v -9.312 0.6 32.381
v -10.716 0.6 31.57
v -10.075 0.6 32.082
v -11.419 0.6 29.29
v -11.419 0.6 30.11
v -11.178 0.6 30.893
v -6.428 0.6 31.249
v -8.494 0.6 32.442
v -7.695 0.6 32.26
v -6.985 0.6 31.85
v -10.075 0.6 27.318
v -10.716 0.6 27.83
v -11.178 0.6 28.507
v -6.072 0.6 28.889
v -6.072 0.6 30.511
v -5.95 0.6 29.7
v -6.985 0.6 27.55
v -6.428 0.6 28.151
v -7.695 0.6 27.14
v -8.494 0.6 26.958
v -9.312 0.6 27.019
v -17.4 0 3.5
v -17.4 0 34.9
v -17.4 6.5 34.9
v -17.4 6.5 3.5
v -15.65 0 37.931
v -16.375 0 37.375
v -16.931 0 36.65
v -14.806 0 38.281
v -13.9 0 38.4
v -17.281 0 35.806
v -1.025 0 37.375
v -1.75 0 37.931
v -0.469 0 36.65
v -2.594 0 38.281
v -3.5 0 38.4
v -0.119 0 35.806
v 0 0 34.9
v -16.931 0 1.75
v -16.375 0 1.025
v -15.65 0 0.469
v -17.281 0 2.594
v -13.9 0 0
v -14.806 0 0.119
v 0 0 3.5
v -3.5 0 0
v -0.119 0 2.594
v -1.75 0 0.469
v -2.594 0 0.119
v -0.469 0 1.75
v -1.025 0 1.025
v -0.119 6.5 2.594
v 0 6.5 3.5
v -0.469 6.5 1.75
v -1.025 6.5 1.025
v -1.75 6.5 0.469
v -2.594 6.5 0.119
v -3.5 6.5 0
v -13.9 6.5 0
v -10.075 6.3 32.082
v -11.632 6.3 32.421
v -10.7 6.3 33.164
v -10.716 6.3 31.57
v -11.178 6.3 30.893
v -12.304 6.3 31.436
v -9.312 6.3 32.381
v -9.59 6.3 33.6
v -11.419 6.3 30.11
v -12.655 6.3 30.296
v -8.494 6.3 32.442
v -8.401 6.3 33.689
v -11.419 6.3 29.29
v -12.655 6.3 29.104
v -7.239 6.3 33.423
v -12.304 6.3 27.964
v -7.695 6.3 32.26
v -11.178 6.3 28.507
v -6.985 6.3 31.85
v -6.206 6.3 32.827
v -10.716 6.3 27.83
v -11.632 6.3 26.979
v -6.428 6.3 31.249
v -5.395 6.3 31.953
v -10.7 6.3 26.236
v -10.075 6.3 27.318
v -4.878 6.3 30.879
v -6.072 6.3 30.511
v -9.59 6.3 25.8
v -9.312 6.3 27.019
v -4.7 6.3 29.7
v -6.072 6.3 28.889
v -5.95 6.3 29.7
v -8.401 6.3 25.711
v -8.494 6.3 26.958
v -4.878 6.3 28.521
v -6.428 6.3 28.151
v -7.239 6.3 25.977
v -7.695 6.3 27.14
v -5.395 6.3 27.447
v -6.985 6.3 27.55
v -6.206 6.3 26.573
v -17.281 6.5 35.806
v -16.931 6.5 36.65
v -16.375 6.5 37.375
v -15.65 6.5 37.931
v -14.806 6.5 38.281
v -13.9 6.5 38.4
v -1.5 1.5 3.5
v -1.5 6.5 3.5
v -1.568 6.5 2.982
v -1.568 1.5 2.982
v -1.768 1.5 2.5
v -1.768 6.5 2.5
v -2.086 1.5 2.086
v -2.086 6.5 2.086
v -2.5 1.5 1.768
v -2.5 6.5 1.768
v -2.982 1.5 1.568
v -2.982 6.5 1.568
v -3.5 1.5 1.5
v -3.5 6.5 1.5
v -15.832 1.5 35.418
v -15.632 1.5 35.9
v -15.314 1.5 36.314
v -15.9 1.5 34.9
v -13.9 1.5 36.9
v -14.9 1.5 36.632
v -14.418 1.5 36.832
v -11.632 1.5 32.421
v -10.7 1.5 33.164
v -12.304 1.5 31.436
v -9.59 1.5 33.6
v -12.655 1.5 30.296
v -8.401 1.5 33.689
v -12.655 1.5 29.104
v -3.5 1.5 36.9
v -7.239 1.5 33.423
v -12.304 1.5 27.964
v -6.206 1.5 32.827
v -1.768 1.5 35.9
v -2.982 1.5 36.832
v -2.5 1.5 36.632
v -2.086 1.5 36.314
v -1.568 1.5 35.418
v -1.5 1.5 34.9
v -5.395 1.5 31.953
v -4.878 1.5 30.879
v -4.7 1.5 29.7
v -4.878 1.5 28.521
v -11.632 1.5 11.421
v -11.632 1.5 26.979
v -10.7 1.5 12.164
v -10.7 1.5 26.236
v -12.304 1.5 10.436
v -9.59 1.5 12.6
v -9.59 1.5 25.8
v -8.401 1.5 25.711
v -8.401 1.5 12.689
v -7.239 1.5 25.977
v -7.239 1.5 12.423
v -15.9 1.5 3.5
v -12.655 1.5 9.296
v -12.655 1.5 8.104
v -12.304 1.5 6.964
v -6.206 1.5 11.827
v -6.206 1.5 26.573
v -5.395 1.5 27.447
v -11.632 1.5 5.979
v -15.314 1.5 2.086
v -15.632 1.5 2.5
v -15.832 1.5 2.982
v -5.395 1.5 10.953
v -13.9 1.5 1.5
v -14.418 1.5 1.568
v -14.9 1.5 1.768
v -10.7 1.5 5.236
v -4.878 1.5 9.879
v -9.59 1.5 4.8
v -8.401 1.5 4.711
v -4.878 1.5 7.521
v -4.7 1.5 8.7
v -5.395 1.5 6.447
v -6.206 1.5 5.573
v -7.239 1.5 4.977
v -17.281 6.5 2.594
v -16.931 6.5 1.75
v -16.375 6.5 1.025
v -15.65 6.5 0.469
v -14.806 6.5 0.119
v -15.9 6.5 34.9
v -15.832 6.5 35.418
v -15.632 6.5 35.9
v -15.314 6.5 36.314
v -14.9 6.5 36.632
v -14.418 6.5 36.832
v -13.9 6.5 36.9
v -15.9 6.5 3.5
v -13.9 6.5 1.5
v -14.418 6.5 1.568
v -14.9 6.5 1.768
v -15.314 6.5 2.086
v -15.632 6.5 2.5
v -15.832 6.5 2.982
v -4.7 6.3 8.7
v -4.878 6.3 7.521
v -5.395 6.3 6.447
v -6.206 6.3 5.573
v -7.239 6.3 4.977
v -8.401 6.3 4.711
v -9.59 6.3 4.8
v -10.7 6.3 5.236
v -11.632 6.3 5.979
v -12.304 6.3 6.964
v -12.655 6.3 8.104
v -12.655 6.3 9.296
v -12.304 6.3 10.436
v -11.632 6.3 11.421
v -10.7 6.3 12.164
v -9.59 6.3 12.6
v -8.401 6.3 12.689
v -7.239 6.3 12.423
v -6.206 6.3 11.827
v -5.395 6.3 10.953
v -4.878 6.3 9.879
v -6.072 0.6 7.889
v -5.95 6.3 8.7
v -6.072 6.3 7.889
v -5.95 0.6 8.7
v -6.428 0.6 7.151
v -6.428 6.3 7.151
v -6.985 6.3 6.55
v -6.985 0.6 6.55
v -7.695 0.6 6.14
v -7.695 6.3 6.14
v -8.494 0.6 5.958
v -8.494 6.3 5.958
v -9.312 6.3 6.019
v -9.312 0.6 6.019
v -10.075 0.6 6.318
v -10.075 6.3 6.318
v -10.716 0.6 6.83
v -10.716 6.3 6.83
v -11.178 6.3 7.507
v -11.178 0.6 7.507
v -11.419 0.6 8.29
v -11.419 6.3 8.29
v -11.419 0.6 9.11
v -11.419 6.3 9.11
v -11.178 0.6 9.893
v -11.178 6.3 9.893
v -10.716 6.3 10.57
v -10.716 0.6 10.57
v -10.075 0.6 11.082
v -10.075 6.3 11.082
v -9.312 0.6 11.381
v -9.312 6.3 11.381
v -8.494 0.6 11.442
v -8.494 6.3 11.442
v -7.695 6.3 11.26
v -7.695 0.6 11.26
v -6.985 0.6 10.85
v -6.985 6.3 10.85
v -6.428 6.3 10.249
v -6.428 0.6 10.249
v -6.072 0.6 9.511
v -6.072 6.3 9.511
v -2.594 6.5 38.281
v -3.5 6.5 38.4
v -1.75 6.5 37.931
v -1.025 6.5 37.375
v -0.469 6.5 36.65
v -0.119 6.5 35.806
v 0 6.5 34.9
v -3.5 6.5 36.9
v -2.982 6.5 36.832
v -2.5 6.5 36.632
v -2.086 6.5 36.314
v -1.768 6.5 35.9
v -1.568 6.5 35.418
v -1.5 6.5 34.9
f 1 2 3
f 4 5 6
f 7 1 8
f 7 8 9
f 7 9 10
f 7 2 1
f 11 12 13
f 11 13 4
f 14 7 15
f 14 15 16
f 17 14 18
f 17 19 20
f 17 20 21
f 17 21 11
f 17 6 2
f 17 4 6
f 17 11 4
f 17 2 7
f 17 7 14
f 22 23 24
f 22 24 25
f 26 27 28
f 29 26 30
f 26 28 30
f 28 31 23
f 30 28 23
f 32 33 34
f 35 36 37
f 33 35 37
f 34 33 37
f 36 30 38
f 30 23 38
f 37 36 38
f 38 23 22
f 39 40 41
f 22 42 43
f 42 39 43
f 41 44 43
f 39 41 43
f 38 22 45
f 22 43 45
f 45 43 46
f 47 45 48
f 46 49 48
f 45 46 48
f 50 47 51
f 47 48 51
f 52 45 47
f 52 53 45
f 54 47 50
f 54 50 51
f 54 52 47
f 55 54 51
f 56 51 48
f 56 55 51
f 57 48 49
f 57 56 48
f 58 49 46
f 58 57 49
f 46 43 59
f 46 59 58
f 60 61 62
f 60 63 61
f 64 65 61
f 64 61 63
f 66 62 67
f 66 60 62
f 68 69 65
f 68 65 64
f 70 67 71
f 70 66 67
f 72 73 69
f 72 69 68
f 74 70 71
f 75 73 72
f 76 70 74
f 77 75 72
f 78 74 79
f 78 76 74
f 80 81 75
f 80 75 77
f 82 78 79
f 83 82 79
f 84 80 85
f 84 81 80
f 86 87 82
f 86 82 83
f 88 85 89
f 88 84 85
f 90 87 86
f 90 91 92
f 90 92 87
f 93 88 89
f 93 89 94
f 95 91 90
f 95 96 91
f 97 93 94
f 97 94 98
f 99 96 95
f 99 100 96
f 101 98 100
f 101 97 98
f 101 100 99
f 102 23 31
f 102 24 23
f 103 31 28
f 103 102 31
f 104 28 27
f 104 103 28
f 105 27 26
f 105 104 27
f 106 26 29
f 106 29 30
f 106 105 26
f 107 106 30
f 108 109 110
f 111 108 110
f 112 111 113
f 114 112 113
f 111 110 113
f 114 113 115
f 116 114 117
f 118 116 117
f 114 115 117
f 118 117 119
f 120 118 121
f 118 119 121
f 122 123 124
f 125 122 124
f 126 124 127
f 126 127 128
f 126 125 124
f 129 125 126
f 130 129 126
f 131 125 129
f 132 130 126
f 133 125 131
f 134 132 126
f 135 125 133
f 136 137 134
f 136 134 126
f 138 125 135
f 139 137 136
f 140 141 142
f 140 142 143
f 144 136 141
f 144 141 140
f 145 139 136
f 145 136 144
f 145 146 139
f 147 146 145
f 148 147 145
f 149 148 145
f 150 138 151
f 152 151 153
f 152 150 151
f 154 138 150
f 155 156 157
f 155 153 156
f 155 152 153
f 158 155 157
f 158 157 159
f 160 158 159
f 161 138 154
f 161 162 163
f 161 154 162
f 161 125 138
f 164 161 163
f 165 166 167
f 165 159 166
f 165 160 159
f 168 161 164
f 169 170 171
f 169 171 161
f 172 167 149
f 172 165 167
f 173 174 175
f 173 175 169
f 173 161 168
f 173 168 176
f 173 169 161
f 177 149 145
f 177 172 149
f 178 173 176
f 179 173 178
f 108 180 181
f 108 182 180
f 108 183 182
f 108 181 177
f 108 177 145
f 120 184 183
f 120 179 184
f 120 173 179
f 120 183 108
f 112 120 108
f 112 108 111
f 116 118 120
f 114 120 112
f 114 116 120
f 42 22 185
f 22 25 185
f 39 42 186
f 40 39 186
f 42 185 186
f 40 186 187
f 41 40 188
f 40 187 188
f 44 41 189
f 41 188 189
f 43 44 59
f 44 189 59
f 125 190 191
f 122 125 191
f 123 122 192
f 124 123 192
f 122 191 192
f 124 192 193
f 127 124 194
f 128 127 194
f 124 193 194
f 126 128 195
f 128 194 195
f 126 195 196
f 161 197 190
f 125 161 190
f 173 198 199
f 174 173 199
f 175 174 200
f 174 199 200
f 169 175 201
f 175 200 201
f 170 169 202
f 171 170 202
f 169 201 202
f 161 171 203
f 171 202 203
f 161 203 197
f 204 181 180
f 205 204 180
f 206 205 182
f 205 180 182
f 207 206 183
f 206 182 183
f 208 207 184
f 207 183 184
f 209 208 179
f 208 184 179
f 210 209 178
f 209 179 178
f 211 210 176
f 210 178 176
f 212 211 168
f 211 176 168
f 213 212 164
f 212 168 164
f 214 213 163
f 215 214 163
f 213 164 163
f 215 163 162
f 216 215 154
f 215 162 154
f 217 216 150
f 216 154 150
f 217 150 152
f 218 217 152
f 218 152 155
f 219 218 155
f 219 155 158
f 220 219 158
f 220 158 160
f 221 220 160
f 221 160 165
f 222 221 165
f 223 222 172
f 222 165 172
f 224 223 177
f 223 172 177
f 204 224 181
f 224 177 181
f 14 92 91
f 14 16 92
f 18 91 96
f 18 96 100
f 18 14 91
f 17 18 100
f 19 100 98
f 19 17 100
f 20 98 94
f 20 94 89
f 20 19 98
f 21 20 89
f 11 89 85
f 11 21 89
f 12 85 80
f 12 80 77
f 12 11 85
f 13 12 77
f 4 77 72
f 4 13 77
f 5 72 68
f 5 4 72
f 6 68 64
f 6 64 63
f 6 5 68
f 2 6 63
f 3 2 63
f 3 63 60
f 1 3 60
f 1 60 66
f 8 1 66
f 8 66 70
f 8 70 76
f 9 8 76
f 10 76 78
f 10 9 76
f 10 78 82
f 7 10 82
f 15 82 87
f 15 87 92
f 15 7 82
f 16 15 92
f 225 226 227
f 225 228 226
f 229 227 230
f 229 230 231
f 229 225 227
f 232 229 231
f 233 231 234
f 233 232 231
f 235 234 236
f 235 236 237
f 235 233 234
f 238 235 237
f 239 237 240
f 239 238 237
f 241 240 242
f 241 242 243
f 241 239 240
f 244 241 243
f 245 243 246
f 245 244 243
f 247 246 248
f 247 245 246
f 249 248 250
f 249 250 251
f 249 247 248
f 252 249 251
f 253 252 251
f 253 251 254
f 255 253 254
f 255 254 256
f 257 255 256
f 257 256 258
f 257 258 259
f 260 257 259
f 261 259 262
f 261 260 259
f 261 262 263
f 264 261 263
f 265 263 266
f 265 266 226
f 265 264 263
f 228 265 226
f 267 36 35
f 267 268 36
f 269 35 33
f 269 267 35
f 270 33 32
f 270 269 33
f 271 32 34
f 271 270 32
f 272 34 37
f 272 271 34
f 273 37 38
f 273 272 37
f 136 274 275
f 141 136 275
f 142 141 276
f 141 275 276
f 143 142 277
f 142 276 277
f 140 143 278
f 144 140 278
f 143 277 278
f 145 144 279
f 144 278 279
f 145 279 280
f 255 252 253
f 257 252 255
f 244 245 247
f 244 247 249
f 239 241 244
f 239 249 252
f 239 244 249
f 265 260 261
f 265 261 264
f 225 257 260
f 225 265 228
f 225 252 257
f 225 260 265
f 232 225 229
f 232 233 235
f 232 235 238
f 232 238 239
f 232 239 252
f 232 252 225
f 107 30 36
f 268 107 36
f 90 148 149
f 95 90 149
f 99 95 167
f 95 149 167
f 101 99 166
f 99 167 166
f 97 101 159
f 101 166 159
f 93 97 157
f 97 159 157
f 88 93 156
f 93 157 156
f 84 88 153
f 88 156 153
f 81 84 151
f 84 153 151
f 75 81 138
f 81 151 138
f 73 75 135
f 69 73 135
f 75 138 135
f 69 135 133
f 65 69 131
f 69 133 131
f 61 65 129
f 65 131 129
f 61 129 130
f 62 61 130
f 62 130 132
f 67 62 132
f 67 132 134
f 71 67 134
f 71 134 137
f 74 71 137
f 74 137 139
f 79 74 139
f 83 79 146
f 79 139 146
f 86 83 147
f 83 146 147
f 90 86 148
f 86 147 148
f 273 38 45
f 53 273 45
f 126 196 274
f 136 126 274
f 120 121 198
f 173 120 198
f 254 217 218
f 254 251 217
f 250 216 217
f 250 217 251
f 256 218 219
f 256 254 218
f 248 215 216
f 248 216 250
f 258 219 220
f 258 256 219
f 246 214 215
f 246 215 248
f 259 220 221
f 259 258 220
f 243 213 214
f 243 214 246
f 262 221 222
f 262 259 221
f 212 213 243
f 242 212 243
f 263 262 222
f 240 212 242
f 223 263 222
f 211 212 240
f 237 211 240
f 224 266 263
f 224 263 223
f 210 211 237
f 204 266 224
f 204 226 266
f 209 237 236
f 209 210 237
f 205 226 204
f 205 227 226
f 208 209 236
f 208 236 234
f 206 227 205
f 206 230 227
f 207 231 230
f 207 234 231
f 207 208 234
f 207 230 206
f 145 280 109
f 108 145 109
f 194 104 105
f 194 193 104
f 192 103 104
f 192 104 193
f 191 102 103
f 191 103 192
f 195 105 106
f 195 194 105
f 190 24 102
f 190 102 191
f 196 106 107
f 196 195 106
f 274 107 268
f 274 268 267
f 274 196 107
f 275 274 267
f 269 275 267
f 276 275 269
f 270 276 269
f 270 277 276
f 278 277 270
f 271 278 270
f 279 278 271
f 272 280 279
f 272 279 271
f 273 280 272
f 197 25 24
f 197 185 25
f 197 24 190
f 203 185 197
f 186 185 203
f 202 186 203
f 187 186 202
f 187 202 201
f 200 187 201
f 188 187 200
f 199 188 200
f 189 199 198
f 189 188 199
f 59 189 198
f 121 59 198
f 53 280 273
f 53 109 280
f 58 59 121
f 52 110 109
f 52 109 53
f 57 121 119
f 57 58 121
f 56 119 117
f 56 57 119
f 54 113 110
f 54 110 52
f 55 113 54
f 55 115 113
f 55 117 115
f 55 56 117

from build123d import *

# Parameters (mm, degrees)
SKETCH1_W           = 17.4
SKETCH1_H           = 38.4
BOSS_EXTRUDE1_DEPTH = 6.5
FILLET1_R           = 3.5
CUT_EXTRUDE1_DEPTH  = 5
SKETCH3_R           = 4
SKETCH3_R_2         = 2.75
BOSS_EXTRUDE2_DEPTH = 4.8
SKETCH4_R           = 2.75
CUT_EXTRUDE2_DEPTH  = 0.9


with BuildPart() as part:
    # Sketch1 → Boss-Extrude1 (new body)
    with BuildSketch(Plane(origin=(0, 0, 0), x_dir=(1, 0, 0), z_dir=(0, 1, 0))):
        with Locations((-8.7, -19.2)):
            Rectangle(SKETCH1_W, SKETCH1_H)
    extrude(amount=BOSS_EXTRUDE1_DEPTH)

    # Fillet1
    fillet1_edges = [part.edges().sort_by_distance(p)[0] for p in [
        (0, 3.25, 38.4),
        (-17.4, 3.25, 38.4),
        (-17.4, 3.25, 0),
        (0, 3.25, 0),
    ]]
    fillet(fillet1_edges, radius=FILLET1_R)

    # Sketch2 → Cut-Extrude1 (cut)
    with BuildSketch(Plane(origin=(0, 6.5, 0), x_dir=(1, 0, 0), z_dir=(0, 1, 0))):
        with BuildLine():
            Line((-13.9, -36.9), (-3.5, -36.9))
            ThreePointArc((-3.5, -36.9), (-2.085786438, -36.314213562), (-1.5, -34.9))
            Line((-1.5, -34.9), (-1.5, -3.5))
            ThreePointArc((-1.5, -3.5), (-2.085786438, -2.085786438), (-3.5, -1.5))
            Line((-3.5, -1.5), (-13.9, -1.5))
            ThreePointArc((-13.9, -1.5), (-15.314213562, -2.085786438), (-15.9, -3.5))
            Line((-15.9, -3.5), (-15.9, -34.9))
            ThreePointArc((-15.9, -34.9), (-15.314213562, -36.314213562), (-13.9, -36.9))
        make_face()
    extrude(amount=-CUT_EXTRUDE1_DEPTH, mode=Mode.SUBTRACT)

    # Sketch3 → Boss-Extrude2 (add)
    with BuildSketch(Plane(origin=(0, 1.5, 0), x_dir=(1, 0, 0), z_dir=(0, 1, 0))):
        with Locations((-8.7, -29.7)):
            Circle(SKETCH3_R)
        with Locations((-8.7, -29.7)):
            Circle(SKETCH3_R_2, mode=Mode.SUBTRACT)
        with Locations((-8.7, -8.7)):
            Circle(SKETCH3_R)
        with Locations((-8.7, -8.7)):
            Circle(SKETCH3_R_2, mode=Mode.SUBTRACT)
    extrude(amount=BOSS_EXTRUDE2_DEPTH)

    # Sketch4 → Cut-Extrude2 (cut)
    with BuildSketch(Plane(origin=(0, 1.5, 0), x_dir=(1, 0, 0), z_dir=(0, 1, 0))):
        with Locations((-8.7, -29.7)):
            Circle(SKETCH4_R)
        with Locations((-8.7, -8.7)):
            Circle(SKETCH4_R)
    extrude(amount=-CUT_EXTRUDE2_DEPTH, mode=Mode.SUBTRACT)


solid = part.part
